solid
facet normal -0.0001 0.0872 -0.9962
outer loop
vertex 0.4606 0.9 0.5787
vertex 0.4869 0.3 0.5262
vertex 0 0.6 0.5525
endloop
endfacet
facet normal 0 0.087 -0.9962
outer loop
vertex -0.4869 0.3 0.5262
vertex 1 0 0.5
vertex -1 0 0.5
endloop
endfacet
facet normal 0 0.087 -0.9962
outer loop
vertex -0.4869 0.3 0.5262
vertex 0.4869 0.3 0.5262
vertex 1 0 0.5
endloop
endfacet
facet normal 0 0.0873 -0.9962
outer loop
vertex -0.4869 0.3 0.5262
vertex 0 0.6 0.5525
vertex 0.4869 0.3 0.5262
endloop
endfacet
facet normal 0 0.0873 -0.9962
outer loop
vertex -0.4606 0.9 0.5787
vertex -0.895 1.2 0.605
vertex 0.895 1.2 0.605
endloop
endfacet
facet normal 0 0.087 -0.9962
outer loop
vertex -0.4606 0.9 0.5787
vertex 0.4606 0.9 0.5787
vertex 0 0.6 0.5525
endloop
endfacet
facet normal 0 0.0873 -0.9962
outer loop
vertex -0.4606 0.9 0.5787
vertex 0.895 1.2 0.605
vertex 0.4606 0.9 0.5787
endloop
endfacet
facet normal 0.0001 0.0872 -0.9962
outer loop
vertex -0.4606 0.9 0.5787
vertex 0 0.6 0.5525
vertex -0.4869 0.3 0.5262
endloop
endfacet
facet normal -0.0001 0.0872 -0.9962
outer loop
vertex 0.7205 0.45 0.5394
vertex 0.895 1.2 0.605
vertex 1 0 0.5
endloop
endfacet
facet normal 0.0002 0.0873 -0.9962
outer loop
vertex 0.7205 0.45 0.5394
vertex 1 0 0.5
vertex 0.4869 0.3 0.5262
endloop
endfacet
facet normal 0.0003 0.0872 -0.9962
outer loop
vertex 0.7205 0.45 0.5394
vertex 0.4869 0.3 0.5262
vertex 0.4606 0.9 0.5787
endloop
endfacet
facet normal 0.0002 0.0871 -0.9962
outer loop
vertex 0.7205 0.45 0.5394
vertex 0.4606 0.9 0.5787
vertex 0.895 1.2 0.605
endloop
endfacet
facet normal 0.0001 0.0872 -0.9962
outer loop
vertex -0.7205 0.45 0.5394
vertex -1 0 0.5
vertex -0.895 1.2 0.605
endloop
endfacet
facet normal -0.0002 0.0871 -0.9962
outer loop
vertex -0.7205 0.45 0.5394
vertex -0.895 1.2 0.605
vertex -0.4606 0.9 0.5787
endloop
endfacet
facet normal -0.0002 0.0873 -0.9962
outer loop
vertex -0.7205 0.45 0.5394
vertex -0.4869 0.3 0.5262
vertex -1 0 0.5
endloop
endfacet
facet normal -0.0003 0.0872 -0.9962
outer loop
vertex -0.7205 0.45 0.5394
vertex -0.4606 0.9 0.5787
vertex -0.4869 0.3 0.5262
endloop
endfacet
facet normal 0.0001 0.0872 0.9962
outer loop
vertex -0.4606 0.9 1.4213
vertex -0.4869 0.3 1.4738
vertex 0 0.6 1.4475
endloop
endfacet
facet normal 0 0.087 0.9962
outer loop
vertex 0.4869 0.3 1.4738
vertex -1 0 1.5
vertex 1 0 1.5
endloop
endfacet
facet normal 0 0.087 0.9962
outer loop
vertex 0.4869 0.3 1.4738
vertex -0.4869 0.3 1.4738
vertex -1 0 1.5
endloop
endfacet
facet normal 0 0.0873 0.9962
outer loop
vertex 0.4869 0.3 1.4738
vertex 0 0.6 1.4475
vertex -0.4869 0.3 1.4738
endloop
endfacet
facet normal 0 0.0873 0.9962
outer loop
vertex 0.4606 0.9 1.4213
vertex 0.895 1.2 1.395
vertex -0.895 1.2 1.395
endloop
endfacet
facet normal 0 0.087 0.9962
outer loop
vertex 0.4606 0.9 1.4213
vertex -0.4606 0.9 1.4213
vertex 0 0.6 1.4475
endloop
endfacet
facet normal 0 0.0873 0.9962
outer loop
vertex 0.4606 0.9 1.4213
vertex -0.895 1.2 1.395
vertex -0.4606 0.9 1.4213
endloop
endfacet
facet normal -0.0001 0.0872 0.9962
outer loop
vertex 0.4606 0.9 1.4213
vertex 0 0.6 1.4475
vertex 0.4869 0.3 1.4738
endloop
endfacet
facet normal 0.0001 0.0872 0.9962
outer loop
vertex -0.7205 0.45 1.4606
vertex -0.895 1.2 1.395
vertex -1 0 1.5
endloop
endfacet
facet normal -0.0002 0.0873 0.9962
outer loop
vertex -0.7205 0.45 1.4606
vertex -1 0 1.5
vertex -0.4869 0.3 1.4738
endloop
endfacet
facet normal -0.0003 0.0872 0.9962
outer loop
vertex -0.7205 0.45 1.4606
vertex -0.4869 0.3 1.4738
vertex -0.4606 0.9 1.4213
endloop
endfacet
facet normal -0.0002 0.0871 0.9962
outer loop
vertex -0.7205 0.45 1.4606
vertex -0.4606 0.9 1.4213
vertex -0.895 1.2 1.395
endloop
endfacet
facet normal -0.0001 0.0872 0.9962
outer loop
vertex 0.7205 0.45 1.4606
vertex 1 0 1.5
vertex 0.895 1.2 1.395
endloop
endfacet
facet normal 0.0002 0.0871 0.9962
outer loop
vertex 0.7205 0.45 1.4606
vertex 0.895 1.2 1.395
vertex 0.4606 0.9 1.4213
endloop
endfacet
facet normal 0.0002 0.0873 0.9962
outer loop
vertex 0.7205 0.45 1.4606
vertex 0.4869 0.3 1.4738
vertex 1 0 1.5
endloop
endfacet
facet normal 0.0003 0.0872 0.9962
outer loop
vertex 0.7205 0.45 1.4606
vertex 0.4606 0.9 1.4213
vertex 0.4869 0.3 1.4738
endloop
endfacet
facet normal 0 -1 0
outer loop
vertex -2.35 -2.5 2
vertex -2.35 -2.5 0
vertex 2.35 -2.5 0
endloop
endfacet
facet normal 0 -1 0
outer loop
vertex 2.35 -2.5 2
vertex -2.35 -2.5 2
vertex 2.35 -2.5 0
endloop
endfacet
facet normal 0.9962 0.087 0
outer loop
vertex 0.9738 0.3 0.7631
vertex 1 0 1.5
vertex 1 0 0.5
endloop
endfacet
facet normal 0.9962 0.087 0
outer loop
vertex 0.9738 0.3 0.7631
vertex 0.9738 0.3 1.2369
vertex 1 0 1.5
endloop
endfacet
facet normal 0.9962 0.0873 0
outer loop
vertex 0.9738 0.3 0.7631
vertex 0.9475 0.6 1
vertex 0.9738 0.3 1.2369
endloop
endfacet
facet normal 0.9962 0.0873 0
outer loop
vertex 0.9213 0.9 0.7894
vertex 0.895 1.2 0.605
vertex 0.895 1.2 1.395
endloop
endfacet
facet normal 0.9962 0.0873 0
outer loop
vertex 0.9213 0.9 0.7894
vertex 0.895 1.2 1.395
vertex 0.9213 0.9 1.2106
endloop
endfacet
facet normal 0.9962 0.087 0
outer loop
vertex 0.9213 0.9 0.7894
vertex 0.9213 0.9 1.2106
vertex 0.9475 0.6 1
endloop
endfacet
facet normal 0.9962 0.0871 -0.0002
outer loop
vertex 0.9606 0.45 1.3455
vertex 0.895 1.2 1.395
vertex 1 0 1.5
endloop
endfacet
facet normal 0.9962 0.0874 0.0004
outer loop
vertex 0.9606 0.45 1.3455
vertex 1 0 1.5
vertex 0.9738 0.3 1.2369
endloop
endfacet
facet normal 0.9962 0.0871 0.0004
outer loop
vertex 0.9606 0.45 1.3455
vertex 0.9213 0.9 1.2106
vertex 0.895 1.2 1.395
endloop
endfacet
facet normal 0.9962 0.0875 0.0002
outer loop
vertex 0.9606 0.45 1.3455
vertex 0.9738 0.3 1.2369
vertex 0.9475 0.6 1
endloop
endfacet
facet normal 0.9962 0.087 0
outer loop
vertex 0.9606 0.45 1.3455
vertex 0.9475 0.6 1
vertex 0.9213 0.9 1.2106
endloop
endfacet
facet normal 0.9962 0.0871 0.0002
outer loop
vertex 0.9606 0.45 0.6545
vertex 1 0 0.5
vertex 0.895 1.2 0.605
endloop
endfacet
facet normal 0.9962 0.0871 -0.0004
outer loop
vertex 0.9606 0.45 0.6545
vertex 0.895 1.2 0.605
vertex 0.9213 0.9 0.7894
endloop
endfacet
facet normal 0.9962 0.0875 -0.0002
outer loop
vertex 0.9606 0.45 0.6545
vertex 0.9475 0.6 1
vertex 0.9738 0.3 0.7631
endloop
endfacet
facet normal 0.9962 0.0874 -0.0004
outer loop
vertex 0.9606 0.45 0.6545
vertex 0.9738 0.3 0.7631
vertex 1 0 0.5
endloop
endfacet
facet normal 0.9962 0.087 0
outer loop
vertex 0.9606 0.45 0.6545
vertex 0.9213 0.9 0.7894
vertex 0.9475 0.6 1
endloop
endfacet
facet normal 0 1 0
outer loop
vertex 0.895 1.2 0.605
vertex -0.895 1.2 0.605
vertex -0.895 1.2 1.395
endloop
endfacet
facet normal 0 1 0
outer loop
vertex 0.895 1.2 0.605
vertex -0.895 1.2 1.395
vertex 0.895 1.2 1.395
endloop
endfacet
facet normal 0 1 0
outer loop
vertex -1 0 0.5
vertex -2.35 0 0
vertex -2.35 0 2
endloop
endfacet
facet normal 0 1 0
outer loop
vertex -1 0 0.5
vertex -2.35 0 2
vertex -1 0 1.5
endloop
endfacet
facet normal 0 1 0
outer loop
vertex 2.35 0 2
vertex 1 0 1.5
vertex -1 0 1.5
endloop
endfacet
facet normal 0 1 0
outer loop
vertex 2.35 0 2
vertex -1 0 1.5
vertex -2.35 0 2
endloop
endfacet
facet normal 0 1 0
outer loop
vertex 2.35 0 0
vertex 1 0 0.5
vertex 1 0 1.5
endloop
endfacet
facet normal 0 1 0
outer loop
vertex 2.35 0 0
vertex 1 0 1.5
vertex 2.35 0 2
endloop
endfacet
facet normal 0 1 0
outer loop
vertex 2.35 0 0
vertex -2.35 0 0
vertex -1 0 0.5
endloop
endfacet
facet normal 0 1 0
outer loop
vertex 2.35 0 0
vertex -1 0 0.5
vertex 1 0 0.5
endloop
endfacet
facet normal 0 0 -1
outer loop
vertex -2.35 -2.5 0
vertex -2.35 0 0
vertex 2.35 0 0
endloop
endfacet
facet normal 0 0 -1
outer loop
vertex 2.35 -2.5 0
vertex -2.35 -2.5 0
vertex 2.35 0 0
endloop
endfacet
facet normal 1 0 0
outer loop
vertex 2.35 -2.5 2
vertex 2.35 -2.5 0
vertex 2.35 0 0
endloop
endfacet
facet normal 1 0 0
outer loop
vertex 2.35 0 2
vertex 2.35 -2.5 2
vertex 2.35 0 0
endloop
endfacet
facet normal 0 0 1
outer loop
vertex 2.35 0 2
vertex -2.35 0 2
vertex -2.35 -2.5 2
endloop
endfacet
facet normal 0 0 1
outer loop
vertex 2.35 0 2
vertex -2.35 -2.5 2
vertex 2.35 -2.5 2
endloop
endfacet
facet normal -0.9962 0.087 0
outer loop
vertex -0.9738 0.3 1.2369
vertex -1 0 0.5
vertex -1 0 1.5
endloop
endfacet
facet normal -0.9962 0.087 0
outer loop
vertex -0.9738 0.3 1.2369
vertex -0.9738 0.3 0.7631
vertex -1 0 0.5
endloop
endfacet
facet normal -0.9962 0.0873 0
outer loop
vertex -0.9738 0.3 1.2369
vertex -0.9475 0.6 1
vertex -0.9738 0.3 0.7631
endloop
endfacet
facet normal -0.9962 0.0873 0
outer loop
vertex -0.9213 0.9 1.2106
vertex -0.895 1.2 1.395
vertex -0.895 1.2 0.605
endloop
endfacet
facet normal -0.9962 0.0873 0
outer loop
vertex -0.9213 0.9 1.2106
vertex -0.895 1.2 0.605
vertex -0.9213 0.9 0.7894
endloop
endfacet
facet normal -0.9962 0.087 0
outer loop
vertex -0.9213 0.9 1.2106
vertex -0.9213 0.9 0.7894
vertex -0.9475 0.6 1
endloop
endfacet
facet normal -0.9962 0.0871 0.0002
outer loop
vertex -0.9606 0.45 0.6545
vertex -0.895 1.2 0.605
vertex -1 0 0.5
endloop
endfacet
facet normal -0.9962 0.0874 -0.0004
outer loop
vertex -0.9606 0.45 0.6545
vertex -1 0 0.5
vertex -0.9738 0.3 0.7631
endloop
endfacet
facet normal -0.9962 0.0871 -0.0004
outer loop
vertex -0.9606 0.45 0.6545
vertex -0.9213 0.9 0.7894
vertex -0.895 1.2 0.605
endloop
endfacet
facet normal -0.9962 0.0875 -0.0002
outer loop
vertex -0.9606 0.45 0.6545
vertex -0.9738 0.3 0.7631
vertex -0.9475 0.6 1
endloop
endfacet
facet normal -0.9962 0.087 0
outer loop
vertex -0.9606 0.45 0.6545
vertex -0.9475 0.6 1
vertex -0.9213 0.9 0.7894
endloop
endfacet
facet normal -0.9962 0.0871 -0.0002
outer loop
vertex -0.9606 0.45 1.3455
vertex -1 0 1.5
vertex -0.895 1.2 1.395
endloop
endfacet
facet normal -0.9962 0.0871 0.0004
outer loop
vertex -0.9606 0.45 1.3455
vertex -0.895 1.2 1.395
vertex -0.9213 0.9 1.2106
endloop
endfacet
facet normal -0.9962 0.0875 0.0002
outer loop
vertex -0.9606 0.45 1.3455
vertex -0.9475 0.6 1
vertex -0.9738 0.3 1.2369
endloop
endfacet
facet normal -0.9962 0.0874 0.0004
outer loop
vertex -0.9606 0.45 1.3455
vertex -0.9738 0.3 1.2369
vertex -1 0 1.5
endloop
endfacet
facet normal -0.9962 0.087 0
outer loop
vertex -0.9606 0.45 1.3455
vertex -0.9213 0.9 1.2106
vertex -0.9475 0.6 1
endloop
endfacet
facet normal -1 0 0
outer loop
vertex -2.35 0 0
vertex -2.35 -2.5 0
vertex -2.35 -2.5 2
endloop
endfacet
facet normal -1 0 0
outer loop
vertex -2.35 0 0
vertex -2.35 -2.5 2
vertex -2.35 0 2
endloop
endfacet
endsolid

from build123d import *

# Parameters (mm, degrees)
SKETCH1_W           = 4.7
SKETCH1_H           = 2.5
BOSS_EXTRUDE1_DEPTH = 2
SKETCH2_W           = 2
SKETCH2_H           = 1
BOSS_EXTRUDE2_DEPTH = 1.2
BOSS_EXTRUDE2_TAPER = 5


with BuildPart() as part:
    # Sketch1 → Boss-Extrude1 (new body)
    with BuildSketch(Plane.XY):
        with Locations((0, -1.25)):
            Rectangle(SKETCH1_W, SKETCH1_H)
    extrude(amount=BOSS_EXTRUDE1_DEPTH)

    # Sketch2 → Boss-Extrude2 (add)
    with BuildSketch(Plane(origin=(0, 0, 0), x_dir=(1, 0, 0), z_dir=(0, 1, 0))):
        with Locations((0, -1)):
            Rectangle(SKETCH2_W, SKETCH2_H)
    extrude(amount=BOSS_EXTRUDE2_DEPTH, taper=BOSS_EXTRUDE2_TAPER)


solid = part.part
